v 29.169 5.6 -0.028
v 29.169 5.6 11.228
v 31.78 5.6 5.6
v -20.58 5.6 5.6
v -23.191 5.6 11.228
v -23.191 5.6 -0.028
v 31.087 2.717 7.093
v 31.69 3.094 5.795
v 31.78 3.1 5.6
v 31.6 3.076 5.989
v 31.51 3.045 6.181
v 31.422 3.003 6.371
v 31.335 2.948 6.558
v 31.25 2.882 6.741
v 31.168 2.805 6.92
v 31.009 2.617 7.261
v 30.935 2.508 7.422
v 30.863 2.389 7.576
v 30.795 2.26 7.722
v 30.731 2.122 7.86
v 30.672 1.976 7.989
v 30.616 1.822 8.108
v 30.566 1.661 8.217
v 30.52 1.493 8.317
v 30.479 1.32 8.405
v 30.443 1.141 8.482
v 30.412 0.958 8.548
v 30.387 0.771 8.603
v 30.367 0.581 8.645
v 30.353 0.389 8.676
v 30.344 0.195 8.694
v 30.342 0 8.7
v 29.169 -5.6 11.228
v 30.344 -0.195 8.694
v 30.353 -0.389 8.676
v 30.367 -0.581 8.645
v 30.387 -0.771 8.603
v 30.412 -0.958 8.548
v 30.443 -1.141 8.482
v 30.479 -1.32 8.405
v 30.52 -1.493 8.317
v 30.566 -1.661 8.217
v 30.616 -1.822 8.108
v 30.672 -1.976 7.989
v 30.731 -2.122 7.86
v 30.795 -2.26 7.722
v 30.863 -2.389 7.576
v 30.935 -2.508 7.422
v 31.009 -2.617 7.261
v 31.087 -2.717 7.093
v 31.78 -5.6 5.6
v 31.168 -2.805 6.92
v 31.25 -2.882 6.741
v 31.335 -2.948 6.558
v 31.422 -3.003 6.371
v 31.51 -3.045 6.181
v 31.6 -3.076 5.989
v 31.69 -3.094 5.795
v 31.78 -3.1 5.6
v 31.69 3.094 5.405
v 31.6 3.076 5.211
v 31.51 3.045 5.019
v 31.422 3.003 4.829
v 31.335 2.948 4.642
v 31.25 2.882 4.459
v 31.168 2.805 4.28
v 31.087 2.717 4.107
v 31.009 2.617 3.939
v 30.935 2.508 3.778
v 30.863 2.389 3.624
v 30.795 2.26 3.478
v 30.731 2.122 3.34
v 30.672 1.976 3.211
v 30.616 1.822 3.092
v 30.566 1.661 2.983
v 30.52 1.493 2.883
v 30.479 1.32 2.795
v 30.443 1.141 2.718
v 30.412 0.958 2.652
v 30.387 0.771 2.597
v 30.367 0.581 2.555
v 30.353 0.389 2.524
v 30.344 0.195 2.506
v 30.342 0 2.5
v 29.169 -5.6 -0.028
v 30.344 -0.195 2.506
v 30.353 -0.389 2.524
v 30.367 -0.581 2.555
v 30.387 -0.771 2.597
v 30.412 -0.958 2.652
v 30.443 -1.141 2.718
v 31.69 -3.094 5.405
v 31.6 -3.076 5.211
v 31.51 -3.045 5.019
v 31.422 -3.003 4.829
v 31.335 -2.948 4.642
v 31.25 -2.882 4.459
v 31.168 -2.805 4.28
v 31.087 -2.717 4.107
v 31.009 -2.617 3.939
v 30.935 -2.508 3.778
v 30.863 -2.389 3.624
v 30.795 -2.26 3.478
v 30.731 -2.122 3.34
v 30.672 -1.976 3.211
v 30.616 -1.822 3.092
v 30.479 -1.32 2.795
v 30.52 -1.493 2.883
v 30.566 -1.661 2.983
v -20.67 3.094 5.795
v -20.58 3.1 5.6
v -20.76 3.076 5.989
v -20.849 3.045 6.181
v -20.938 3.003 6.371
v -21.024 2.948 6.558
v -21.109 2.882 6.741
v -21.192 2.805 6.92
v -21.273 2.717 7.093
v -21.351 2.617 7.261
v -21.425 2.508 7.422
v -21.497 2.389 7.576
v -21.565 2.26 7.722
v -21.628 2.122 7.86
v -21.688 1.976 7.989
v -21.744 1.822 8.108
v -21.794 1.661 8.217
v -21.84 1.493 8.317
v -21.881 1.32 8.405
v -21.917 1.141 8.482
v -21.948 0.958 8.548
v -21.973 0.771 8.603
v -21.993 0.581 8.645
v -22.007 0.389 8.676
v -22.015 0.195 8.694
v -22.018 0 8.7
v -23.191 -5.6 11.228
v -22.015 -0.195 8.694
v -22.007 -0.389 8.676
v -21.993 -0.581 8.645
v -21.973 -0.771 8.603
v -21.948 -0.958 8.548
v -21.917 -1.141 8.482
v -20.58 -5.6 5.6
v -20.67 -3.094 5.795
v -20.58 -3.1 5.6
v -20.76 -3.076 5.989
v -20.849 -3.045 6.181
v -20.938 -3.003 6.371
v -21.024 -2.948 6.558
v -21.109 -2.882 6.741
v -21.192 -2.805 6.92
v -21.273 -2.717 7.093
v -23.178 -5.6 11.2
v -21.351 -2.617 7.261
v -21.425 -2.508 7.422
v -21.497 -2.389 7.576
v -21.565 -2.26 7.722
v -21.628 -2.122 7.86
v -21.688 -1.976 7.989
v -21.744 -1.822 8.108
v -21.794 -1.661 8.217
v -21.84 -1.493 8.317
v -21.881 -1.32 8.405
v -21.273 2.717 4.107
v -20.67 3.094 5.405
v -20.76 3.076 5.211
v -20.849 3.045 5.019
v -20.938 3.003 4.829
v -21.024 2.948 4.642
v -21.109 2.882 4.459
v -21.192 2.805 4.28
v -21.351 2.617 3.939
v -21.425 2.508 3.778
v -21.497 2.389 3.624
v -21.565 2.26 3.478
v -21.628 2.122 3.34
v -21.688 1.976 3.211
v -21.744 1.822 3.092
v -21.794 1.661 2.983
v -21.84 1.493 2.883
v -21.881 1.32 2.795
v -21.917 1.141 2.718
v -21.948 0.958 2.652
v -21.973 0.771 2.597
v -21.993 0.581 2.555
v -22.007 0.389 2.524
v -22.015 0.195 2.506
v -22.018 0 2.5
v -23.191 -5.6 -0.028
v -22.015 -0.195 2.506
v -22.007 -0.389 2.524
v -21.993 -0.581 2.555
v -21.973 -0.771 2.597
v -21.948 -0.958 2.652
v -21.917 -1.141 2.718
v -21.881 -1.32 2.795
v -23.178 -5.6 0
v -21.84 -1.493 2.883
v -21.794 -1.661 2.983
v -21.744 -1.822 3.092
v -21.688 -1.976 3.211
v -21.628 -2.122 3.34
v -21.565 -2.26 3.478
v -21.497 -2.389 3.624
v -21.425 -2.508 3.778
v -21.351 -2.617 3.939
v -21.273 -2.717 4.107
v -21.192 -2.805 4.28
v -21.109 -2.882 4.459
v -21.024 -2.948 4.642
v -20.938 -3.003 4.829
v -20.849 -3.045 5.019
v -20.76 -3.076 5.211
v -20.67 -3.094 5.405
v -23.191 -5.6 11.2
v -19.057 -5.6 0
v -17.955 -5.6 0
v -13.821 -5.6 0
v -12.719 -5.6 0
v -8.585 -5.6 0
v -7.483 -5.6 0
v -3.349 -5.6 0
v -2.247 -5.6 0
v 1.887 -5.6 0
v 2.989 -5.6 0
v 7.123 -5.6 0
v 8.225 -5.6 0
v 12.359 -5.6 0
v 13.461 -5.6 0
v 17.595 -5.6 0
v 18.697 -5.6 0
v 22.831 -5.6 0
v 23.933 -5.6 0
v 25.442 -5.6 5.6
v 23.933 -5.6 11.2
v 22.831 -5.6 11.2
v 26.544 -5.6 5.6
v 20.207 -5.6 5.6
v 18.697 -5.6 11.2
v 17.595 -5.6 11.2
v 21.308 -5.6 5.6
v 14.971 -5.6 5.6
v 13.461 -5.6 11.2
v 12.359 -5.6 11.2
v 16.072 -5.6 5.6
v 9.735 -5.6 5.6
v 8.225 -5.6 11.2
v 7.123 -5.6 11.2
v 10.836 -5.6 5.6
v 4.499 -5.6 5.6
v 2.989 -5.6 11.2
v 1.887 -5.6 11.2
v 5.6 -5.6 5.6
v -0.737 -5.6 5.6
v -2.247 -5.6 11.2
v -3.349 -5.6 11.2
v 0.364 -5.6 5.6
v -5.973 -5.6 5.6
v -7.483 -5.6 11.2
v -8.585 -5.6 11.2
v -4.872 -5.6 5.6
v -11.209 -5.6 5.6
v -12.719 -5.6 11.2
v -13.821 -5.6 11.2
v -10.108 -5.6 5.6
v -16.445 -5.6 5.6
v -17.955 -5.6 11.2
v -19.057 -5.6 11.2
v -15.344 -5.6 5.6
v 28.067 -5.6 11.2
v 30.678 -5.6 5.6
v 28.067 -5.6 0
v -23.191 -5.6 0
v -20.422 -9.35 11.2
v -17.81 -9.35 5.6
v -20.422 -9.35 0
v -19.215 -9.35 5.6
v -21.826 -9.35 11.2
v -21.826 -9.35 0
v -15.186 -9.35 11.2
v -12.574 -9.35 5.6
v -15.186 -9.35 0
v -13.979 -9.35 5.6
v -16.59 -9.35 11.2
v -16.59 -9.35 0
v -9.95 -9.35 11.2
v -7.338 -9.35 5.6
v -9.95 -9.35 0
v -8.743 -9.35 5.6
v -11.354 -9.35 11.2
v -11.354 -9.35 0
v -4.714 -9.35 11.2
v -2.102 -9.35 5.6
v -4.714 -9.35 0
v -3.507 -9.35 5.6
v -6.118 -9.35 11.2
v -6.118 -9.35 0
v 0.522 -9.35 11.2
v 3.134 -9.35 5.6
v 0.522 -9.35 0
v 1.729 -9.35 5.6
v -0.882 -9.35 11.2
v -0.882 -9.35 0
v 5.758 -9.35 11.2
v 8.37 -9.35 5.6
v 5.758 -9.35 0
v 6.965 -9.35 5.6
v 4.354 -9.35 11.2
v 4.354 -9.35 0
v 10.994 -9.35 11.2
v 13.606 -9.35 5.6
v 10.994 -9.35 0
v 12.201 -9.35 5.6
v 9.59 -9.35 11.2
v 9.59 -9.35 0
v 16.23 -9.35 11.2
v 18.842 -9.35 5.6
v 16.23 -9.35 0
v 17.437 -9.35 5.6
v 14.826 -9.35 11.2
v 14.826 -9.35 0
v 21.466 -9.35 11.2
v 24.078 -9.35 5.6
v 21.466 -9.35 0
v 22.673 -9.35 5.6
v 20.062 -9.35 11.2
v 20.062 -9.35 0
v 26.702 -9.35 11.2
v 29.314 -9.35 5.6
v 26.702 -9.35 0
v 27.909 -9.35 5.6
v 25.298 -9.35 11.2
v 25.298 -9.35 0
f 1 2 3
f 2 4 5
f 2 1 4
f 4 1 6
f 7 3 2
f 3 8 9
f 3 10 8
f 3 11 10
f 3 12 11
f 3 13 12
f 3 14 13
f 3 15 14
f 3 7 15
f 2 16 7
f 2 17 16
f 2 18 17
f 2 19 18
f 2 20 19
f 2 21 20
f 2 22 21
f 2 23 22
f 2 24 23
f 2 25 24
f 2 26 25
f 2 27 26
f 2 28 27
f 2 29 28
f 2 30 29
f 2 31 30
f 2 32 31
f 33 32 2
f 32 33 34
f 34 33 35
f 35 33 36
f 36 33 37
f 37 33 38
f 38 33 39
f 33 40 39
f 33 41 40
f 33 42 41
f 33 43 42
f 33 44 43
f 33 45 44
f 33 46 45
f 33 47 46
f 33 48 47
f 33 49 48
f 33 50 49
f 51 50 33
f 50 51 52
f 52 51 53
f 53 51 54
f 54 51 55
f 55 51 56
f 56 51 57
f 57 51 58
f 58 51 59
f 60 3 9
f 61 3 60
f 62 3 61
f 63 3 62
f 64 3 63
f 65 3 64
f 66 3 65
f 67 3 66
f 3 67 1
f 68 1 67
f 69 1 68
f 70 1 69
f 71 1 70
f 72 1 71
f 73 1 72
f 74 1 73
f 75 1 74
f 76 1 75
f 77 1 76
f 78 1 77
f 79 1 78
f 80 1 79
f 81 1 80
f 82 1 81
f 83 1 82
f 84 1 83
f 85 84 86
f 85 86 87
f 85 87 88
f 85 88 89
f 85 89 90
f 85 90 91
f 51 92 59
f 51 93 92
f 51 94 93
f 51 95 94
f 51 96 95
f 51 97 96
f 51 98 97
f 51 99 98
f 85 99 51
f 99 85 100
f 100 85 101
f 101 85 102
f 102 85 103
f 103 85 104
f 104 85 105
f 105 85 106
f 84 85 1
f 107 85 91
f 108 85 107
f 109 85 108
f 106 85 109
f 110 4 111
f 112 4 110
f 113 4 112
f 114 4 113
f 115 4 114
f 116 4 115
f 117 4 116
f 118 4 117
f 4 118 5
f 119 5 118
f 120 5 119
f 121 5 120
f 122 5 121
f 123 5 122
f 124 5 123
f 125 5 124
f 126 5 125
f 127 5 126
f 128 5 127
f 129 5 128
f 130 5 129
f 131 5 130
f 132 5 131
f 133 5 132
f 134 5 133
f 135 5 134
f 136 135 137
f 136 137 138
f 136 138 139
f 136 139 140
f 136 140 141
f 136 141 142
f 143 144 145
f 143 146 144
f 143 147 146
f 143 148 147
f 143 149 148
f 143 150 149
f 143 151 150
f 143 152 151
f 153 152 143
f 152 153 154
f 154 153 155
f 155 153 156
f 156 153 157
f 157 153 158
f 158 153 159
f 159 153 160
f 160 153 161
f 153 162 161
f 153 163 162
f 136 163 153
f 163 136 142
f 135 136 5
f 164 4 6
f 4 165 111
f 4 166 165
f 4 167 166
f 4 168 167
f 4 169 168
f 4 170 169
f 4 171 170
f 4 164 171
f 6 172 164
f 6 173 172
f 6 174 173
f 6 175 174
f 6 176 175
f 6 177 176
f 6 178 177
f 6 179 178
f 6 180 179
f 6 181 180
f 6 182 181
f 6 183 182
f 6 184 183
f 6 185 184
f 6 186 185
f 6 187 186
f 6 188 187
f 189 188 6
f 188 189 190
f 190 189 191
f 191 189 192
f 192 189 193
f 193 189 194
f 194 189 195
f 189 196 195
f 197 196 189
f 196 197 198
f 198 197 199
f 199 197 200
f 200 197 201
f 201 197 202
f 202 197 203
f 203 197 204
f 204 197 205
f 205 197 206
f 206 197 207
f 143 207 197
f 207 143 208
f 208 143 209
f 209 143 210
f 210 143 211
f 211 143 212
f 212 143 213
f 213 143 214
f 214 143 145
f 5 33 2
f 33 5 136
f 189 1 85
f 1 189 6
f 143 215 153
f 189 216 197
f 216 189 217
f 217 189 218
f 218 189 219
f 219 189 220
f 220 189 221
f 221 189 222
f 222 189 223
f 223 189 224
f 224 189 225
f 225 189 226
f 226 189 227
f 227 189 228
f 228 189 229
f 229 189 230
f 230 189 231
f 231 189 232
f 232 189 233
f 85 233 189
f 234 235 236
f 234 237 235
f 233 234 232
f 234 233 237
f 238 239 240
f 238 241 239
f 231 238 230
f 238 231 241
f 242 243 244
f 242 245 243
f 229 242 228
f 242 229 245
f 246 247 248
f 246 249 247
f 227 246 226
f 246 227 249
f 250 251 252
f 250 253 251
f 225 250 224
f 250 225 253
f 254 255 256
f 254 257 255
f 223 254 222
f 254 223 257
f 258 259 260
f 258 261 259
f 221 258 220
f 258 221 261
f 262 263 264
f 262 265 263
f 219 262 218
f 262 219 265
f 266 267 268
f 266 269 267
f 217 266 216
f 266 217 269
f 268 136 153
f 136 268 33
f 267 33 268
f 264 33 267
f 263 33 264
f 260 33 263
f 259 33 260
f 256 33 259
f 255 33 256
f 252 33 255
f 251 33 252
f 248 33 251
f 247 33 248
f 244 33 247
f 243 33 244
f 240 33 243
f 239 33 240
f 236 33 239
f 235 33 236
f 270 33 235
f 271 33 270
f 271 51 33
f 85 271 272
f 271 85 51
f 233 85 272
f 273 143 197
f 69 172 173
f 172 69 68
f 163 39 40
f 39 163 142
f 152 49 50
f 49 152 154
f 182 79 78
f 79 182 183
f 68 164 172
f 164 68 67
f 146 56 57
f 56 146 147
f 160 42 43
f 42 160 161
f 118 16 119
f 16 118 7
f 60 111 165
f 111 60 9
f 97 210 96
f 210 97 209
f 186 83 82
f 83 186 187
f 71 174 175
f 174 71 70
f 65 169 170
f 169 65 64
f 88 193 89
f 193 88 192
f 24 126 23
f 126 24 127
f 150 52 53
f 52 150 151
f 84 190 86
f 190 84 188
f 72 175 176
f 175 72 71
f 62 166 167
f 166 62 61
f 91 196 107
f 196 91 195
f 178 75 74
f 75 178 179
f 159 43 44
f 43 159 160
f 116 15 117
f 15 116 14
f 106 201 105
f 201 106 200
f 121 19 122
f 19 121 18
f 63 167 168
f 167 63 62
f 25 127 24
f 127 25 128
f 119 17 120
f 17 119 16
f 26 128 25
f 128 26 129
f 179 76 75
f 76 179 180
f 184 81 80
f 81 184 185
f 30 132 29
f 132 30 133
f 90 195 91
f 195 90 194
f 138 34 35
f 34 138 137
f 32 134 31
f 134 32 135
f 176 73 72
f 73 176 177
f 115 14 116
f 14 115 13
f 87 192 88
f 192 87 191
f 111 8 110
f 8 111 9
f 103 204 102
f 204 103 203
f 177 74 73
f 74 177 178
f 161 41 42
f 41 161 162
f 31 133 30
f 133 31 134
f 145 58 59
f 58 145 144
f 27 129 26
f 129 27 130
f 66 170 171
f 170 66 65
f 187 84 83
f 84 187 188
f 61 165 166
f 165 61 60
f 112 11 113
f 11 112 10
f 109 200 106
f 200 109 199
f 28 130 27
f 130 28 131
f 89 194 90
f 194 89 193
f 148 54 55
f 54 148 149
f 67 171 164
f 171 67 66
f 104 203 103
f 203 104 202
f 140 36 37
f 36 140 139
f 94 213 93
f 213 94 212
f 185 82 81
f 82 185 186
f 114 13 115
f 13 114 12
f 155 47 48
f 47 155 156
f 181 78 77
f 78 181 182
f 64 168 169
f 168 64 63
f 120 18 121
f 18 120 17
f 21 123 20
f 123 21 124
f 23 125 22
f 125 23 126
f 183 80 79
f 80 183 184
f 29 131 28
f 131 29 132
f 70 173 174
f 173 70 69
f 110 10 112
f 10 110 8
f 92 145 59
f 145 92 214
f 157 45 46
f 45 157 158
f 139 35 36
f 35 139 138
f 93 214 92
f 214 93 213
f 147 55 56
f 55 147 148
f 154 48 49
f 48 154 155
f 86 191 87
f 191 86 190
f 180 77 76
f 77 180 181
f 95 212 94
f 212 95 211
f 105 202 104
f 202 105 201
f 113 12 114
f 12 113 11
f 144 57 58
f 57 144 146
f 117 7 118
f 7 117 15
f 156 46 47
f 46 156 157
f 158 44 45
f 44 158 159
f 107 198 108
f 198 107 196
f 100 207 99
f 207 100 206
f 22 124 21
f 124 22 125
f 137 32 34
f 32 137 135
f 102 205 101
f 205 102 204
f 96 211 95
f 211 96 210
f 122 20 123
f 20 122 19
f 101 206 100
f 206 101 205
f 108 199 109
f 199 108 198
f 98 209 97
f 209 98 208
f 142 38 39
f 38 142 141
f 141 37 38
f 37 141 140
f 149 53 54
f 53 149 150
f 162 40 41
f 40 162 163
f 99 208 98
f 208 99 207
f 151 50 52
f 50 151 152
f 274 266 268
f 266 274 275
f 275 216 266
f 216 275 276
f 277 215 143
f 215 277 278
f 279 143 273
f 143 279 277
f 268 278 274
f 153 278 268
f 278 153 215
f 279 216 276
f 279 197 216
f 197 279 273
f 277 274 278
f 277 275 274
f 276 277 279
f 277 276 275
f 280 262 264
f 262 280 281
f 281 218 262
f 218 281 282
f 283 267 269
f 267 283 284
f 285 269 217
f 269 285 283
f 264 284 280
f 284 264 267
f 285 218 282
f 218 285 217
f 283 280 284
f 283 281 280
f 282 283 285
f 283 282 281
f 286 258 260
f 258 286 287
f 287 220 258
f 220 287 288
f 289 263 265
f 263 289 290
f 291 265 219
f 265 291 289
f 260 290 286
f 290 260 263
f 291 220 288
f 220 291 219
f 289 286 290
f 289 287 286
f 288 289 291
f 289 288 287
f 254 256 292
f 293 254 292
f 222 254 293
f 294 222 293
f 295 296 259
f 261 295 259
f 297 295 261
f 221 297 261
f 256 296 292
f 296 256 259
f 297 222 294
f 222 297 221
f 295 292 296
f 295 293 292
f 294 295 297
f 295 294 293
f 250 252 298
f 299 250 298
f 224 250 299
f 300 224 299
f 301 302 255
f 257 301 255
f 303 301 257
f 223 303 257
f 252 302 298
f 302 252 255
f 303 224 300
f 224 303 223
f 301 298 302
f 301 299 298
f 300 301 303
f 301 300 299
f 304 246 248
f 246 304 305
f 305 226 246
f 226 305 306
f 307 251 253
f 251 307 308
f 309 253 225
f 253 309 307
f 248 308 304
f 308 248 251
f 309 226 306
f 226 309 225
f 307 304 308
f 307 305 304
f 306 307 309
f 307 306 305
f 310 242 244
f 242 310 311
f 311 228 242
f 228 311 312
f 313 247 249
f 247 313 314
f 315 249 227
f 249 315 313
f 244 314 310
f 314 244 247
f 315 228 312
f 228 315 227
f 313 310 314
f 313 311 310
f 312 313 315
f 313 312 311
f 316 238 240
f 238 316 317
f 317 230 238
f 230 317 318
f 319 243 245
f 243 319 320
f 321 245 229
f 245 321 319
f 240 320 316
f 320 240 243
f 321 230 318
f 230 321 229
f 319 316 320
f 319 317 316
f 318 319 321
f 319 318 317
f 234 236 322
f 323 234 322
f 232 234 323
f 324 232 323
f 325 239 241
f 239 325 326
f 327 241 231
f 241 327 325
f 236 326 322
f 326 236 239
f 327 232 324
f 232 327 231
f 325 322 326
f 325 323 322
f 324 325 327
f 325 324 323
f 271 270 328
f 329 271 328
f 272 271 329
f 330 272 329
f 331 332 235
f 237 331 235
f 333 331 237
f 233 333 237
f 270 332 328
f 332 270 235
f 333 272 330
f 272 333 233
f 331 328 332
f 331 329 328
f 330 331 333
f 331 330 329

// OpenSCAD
// Parametric Modular Rack Mark "Ckaos" Moissette
//Based on the work of MattMoses and Fdavies :
//http://forums.reprap.org/read.php?1,51452,52099#msg-52099
//and Forrest Higgs:
// http://technocraticanarchist.blogspot.com/2010/01/high-speed-alternative-to-belts.html
//It is licensed under the Creative Commons - GNU GPL license.
// © 2011 by Mark "Ckaos" Moissette
//more info at :www.kaosat.net and
//http://www.thingiverse.com/thing:6011


pi=3.1415926535897932384626433832795;
innerRadius=3.1;//shaft radius, in mm
borders=2.5;//how thick should the borders around the central "shaft" be, in mm
diametralPitch=12;
numberOfTeeth=10;
pressureAngle=20*pi/180;
centerAngle=25;//angle at center of teeth


//example usage
rack(innerRadius,borders,diametralPitch,numberOfTeeth,pressureAngle,centerAngle);


module rack(innerRadius,borders,P,N,PA,CA)
{
	// P = diametral pitch
	// N = number of teeth
	// PA = pressure angle in radians
	// x, y = linear offset distances
	a = 1/P; // addendum (also known as "module")
	d = 1.25/P; // dedendum (this is set by a standard)
	multiplier=20;//20
	height=(d+a)*multiplier;
	
	
	// find the tangent of pressure angle once
	tanPA = tan(PA*(180/pi));
	// length of bottom and top horizontal segments of tooth profile
	botL = (pi/P/2 - 2*d*tanPA)*multiplier;
	topL =( pi/P/2 - 2*a*tanPA)*multiplier;

	slantLng=tanPA*height;
	realBase=2*slantLng+topL;
	
	
	offset=topL+botL+2*slantLng;
	length=(realBase+botL)*N;

	supportSize=(innerRadius+borders)*2;

	//calculate tooth params
	basesegmentL=realBase/2;
	basesegmentW=supportSize/2;

	topsegmentL=topL/2;
	topsegmentW=supportSize/2;

	baseoffsetY=tan(CA)*basesegmentW;
	topoffsetY=tan(CA)*topsegmentW;
	
	//calculate support params

	totalSupportLength=(N)*(offset);
	supportL=totalSupportLength/2;
	supportW=supportSize/1.99;
	
	echo("Total length",totalSupportLength+baseoffsetY);
	echo("Total height",supportSize);

	
	rotate([90,90,0])
	{
	translate([-supportSize/2,supportSize/2,0])
	{
	union()
	{
		difference()
		{
			support(supportL,supportW,supportSize,baseoffsetY);
			rotate([90,90,0]) 
			{cylinder(h=length+10,r=innerRadius,center=true,$fn=100);}
		}

	
		for (i = [0:N-1]) 
		{
			translate([0,i*offset-length/2+realBase/2,supportSize/2+height/2]) 
			{	
				
				tooth(basesegmentL,basesegmentW,topsegmentL,topsegmentW,height,baseoffsetY,topoffsetY);
				
			}
		}
	}
	
	}
	}
}

module support(supportL,supportW,height,offsetY)
{
	 tooth(supportL,supportW,supportL,supportW,height,offsetY,offsetY);
}



module tooth(basesegmentL,basesegmentW,topsegmentL,topsegmentW,height,baseoffsetY,topoffsetY)//top : width*length, same for base
{
	
	////////////////
	basePT1=[
	-basesegmentW,
	basesegmentL-baseoffsetY,
	-height/2];

	basePT2=[
	0,
	basesegmentL,
	-height/2];

	basePT3=[
	basesegmentW,
	basesegmentL-baseoffsetY,
	-height/2];

	basePT4=[
	basesegmentW,
	basesegmentL-(baseoffsetY+basesegmentL*2),
	-height/2];
	
	basePT5=[
	0,
	-basesegmentL,
	-height/2];

	basePT6=[
	-basesegmentW,
	basesegmentL-(baseoffsetY+basesegmentL*2),
	-height/2];
	//////////////////////////
	topPT1=[
	-topsegmentW,
	topsegmentL-topoffsetY,
	height/2];

	topPT2=[
	0,
	topsegmentL,
	height/2];

	topPT3=[
	topsegmentW,
	topsegmentL-topoffsetY,
	height/2];

	topPT4=[
	topsegmentW,
	topsegmentL-(topoffsetY+topsegmentL*2),
	height/2];
	
	topPT5=[
	0,
	-topsegmentL,
	height/2];

	topPT6=[
	-topsegmentW,
	topsegmentL-(topoffsetY+topsegmentL*2),
	height/2];
	//////////////////////////

	//////////////////////////

	polyhedron(
	points=[
		basePT1,
		basePT2,
		basePT3,
		basePT4,
		basePT5,
		basePT6,
		topPT1,
		topPT2,
		topPT3,
		topPT4,
		topPT5,
		topPT6],
	triangles=[
	//base
	[5,1,0],
	[4,1,5],
	[4,2,1],
	[3,2,4],	

	//front
	[1,6,0],
	[7,6,1],
	[2,7,1],
	[8,7,2],
	//back
	[11,10,5],
	[5,10,4],
	[10,9,4],
	[4,9,3],	
	//side 1
	[0,11,5],
	[6,11,0],
	//side 2
	[3,8,2],
	[9,8,3],
	//top
	[9,10,8],
	[10,7,8],
	[11,7,10],
	[6,7,11],
	]
	);
}

module demo_gear(position,diametralPitch)
{
	wheelSize=12;
rotate([0,90,180])
translate(position)

{
gear (
	number_of_teeth=8,
	circular_pitch=300, 
	pressure_angle=19.34,
	gear_thickness=wheelSize/2,
	rim_thickness=wheelSize/2,
	hub_thickness=0,
	bore_diameter=2,
	backlash=0,twist=centerAngle,involute_facets=15);

translate([0,0,wheelSize/2])
rotate([0,0,-centerAngle])
gear (
	number_of_teeth=8,
	circular_pitch=300, 
	pressure_angle=19.34,
	gear_thickness=wheelSize/2,
	rim_thickness=wheelSize/2,
	hub_thickness=0,
	bore_diameter=2,
	backlash=0,twist=-centerAngle,involute_facets=15);

}

}
